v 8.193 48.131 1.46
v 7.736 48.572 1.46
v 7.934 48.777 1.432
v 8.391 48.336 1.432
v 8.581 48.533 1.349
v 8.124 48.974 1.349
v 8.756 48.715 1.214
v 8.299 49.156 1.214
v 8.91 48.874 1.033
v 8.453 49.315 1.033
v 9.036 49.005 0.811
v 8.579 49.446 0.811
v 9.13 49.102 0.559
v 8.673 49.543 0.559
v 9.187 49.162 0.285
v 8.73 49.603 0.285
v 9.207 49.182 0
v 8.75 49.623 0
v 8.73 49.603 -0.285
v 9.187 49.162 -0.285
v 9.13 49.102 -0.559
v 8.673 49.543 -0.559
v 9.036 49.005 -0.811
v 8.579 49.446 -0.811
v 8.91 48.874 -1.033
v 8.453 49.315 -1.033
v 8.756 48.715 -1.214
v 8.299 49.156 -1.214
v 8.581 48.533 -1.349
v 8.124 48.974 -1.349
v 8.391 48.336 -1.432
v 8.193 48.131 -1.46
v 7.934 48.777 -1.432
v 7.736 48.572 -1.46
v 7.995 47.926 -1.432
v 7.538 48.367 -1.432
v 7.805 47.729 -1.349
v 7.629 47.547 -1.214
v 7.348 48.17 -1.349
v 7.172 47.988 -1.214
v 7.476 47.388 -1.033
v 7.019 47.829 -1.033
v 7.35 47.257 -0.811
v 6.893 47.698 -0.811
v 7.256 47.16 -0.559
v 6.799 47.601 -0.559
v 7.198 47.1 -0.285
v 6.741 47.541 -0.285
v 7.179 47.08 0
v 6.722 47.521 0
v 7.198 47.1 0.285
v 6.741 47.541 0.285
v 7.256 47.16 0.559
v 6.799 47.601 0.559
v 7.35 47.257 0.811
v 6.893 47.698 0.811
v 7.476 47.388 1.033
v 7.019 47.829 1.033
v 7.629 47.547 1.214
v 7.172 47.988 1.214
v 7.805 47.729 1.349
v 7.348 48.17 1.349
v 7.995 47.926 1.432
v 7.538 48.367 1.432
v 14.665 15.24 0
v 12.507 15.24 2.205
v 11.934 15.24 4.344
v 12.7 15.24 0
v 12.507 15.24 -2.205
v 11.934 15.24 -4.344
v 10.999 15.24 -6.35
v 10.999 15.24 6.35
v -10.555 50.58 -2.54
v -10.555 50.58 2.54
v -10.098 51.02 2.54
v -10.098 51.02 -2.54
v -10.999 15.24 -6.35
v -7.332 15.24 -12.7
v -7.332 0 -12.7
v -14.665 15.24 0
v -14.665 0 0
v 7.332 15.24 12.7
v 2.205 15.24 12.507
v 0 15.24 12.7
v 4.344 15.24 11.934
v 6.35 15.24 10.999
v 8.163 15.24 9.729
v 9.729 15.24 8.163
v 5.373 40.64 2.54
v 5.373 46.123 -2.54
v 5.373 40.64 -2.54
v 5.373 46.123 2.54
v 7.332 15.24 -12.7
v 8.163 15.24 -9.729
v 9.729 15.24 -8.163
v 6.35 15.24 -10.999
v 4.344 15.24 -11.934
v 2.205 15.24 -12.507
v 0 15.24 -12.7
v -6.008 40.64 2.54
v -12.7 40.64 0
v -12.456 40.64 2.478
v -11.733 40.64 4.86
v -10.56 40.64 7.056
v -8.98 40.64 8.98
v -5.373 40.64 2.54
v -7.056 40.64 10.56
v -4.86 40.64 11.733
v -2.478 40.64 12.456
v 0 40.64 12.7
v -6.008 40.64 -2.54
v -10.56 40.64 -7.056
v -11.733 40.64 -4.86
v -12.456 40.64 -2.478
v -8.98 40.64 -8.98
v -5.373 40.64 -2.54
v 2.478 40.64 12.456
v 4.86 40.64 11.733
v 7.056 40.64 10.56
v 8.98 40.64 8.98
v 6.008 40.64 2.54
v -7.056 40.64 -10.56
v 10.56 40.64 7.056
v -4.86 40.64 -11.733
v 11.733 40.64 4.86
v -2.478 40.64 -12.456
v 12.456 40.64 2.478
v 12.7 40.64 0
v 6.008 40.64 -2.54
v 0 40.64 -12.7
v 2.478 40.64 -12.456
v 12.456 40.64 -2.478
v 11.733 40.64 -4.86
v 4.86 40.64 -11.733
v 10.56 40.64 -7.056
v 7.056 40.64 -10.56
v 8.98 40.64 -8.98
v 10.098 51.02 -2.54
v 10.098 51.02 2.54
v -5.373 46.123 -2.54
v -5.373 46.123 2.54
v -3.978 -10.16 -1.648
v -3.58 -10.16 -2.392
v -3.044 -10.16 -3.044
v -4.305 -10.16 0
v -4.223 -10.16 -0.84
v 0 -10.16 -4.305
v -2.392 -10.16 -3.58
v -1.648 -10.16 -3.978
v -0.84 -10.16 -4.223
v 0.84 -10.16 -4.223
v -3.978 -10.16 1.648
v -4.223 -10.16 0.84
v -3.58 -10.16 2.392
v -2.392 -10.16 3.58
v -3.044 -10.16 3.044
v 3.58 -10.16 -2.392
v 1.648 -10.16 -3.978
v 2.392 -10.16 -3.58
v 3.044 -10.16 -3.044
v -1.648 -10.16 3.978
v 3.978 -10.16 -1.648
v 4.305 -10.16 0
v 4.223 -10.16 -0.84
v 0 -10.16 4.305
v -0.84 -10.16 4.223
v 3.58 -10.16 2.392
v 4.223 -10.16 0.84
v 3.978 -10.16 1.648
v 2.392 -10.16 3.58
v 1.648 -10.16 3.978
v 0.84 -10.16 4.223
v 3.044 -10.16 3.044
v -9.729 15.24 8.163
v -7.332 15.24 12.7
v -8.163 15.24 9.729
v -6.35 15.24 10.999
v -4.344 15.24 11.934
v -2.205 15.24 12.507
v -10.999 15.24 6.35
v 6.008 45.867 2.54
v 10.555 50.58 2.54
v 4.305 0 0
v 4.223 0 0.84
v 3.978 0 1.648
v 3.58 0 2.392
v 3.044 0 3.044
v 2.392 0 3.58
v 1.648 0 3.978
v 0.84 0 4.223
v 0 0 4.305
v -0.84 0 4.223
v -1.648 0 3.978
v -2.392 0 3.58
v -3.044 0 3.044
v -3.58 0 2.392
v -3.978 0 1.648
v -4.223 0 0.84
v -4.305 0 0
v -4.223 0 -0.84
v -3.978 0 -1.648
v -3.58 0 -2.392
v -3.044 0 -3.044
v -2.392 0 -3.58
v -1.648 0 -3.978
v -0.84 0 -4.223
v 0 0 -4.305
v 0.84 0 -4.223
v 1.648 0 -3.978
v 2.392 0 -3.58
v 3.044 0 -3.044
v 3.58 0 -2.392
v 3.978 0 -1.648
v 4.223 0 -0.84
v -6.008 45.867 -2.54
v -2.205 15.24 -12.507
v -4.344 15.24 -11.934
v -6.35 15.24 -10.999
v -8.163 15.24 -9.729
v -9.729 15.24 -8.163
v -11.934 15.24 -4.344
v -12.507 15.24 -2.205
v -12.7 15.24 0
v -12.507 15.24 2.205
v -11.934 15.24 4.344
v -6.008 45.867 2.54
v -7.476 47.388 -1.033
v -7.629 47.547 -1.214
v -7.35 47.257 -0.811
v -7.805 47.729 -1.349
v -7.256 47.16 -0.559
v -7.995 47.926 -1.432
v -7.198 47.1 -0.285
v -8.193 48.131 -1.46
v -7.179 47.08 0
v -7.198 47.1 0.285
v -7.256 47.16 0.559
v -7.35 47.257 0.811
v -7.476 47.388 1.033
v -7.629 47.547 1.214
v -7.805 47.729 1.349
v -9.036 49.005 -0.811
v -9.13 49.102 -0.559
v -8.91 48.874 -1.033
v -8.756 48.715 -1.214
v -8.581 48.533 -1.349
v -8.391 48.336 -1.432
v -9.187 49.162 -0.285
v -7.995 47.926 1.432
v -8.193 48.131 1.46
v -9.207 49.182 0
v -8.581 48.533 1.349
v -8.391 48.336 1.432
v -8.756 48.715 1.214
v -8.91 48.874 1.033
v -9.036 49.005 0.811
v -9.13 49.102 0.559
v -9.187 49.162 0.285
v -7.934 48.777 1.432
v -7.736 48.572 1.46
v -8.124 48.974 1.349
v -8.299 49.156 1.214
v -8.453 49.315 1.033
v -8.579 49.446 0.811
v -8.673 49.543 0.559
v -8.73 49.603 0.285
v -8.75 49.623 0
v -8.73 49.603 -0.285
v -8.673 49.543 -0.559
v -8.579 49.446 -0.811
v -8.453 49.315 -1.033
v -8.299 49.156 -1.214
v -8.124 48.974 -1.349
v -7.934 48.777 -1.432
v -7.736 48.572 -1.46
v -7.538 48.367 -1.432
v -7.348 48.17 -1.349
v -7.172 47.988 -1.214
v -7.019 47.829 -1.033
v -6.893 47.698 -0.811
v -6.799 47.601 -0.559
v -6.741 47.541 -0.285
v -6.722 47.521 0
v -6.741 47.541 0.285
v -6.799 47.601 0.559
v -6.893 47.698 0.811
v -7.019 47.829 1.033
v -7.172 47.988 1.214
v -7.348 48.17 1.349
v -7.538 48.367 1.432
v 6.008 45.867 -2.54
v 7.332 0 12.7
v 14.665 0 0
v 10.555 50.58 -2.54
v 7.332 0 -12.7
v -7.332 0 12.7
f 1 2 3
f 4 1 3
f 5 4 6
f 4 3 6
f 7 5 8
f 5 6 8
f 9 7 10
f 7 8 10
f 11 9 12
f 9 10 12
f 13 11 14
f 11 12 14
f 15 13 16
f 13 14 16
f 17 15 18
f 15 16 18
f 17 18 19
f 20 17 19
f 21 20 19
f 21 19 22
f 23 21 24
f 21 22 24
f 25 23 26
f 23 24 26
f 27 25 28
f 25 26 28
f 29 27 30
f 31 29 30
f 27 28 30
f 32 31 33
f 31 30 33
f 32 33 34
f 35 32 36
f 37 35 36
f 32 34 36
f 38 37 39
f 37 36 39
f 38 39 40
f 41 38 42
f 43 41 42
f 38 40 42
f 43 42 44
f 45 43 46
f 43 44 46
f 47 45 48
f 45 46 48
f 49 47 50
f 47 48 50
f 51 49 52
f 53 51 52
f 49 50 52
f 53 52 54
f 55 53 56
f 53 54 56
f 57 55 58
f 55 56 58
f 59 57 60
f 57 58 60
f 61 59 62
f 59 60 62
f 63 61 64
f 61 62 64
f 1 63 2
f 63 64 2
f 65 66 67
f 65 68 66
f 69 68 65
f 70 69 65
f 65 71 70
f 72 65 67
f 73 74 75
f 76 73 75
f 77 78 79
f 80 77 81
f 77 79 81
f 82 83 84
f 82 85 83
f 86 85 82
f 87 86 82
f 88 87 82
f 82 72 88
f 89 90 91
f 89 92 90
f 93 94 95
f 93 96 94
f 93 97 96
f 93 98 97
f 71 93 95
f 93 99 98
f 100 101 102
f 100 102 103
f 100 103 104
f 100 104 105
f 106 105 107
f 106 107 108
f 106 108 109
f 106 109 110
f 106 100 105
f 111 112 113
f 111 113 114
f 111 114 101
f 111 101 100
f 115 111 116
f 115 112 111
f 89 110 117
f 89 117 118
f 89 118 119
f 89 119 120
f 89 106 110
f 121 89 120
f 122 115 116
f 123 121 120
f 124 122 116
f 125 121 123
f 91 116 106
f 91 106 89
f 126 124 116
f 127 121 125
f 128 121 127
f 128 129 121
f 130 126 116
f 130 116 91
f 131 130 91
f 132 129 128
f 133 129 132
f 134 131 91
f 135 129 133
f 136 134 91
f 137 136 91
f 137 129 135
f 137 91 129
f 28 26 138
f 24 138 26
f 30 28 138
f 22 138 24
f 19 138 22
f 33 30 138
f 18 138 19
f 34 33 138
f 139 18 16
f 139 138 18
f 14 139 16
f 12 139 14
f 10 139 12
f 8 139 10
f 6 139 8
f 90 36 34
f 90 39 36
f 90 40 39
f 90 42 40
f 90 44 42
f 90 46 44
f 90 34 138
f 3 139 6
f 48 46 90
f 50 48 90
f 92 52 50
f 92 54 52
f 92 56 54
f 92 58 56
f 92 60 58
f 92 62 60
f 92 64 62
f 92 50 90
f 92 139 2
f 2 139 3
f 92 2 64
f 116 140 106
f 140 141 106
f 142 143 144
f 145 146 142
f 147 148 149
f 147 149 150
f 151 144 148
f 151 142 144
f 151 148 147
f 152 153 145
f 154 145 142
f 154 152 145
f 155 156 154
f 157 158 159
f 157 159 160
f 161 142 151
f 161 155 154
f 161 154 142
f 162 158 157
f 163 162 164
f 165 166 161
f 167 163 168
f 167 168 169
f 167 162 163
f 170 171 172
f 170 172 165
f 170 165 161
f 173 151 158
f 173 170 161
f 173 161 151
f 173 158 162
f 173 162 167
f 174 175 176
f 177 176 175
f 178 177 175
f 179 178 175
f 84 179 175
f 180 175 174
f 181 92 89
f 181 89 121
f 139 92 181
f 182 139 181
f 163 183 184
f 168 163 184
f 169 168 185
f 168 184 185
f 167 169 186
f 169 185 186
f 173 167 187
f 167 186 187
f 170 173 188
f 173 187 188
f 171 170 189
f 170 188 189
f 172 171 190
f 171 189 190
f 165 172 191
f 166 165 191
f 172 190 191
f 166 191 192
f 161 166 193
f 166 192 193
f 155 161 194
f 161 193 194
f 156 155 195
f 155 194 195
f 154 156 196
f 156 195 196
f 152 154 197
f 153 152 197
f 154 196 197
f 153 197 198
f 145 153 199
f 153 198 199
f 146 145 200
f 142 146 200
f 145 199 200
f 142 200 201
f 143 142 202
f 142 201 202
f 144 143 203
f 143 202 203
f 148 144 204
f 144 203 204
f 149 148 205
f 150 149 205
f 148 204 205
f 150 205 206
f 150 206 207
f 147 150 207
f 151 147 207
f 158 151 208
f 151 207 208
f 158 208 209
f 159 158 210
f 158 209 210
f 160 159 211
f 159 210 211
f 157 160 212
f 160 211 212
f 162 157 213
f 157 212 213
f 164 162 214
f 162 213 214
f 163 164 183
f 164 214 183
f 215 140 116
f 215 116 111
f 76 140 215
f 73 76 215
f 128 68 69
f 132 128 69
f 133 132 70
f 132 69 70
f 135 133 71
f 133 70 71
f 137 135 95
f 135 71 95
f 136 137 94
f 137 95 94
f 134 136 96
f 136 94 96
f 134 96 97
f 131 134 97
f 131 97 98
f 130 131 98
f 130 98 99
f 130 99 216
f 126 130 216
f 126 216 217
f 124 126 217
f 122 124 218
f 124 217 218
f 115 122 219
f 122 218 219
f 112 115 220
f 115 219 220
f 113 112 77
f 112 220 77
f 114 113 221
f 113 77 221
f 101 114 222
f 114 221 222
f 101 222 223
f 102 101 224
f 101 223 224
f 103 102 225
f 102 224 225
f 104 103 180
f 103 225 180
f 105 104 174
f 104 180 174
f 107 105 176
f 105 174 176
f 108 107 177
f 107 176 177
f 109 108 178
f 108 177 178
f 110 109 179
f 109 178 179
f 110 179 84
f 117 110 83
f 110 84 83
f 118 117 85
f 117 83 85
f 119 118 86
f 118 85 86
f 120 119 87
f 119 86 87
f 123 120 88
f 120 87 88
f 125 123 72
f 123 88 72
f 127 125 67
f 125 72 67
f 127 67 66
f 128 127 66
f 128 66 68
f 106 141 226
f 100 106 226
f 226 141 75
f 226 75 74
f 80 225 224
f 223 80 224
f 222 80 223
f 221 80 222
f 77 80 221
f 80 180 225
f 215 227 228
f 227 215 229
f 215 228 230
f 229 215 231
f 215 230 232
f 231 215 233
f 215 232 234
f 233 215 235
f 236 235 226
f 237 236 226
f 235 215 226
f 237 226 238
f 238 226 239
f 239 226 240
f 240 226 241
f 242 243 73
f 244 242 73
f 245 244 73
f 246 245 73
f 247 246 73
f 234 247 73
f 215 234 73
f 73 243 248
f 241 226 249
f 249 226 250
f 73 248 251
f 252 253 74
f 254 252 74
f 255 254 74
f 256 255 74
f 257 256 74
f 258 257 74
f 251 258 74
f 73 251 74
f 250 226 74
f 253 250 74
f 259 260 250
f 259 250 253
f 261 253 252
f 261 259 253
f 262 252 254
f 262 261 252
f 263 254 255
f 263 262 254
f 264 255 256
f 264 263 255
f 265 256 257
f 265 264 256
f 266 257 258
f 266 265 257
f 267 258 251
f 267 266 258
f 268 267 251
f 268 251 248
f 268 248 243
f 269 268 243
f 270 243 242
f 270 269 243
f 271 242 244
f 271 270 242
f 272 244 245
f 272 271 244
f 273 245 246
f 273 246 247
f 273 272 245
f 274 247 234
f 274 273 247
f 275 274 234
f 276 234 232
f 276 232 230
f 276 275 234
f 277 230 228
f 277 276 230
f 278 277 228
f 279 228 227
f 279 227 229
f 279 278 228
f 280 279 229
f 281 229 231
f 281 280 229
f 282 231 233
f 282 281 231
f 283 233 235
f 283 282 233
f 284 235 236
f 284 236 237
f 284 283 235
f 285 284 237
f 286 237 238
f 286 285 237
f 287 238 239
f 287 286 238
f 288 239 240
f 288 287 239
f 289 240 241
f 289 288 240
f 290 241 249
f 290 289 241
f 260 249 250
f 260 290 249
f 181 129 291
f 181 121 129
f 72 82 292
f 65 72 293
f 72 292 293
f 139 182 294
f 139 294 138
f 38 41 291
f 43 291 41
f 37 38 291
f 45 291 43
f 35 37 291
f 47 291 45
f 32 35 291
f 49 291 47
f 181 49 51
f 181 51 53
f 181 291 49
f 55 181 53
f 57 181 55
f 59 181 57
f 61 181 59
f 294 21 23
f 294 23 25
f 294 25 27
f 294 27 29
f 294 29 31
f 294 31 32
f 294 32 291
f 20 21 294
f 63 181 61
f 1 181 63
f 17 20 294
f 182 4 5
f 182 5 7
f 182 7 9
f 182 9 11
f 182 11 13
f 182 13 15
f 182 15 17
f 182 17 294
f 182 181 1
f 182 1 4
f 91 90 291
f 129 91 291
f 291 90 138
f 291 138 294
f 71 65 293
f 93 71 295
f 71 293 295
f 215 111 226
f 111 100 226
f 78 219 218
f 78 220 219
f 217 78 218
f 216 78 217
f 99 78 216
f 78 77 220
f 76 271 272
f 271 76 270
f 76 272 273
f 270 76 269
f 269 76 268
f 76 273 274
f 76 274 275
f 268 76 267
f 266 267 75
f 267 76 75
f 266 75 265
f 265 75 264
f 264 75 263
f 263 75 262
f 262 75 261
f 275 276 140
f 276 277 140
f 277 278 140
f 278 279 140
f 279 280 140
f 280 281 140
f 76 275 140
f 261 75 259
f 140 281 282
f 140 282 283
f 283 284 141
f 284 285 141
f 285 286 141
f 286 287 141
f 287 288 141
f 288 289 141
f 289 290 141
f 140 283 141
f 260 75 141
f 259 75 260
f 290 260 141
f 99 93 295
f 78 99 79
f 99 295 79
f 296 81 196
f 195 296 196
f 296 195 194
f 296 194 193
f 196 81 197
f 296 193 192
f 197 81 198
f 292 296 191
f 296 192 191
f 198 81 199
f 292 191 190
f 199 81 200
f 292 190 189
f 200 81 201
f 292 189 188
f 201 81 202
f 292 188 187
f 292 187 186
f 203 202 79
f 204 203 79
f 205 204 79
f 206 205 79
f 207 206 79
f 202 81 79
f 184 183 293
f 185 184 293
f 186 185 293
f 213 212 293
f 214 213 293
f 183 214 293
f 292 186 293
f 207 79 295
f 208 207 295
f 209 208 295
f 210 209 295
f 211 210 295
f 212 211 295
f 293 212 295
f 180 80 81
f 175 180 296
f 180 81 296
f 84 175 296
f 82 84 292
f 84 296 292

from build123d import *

# Parameters (mm, degrees)
BOSS_EXTRUDE1_DEPTH = 15.24
SKETCH3_R           = 12.7
BOSS_EXTRUDE2_DEPTH = 25.4
SKETCH4_R           = 4.3053
BOSS_EXTRUDE3_DEPTH = 10.16
EXTRUDE_THIN1_DEPTH = 2.54
CUT_EXTRUDE1_REACH  = 50.698
SKETCH6_R           = 1.4605


with BuildPart() as part:
    # Sketch2 → Boss-Extrude1 (new body)
    with BuildSketch(Plane(origin=(0, 0, 0), x_dir=(1, 0, 0), z_dir=(0, 1, 0))):
        Polygon((7.332348419, 12.7), (-7.332348419, 12.7), (-14.664696837, 0), (-7.332348419, -12.7), (7.332348419, -12.7), (14.664696837, 0), align=None)
    extrude(amount=BOSS_EXTRUDE1_DEPTH)

    # Sketch3 → Boss-Extrude2 (add)
    with BuildSketch(Plane(origin=(0, 15.24, 0), x_dir=(1, 0, 0), z_dir=(0, 1, 0))):
        Circle(SKETCH3_R)
    extrude(amount=BOSS_EXTRUDE2_DEPTH)

    # Sketch4 → Boss-Extrude3 (add)
    with BuildSketch(Plane.XZ):
        Circle(SKETCH4_R)
    extrude(amount=BOSS_EXTRUDE3_DEPTH)

    # Sketch5 → Extrude-Thin1 (add, symmetric)
    with BuildSketch(Plane.XY):
        Polygon((6.008182396, 40.64), (6.008182396, 45.866997676), (10.555270964, 50.579540341), (10.098307994, 51.020459659), (5.373182396, 46.123401761), (5.373182396, 40.64), align=None)
    extrude_thin1 = extrude(amount=EXTRUDE_THIN1_DEPTH, both=True)

    # Sketch6 → Cut-Extrude1 (cut, up to next)
    with BuildSketch(Plane(origin=(-20.264409117, 19.552939797, 0), x_dir=(0, 0, 1), z_dir=(-0.7196267237821845, 0.6943611296857851, 0)), mode=Mode.PRIVATE) as cut_extrude1_sk1:
        with Locations((0, 40.325060137)):
            Circle(SKETCH6_R)
    cut_extrude1_tool1 = extrude(cut_extrude1_sk1.sketch, amount=-CUT_EXTRUDE1_REACH, mode=Mode.PRIVATE) & part.part
    cut_extrude1 = cut_extrude1_tool1.solids().sort_by_distance((7.735745, 48.571931, 0))[0]
    add(cut_extrude1, mode=Mode.SUBTRACT)

    # Mirror1: Extrude-Thin1, Cut-Extrude1 across plane
    add(extrude_thin1.mirror(Plane(origin=(0, 0, 0), x_dir=(0, 0, 1), z_dir=(1, 0, 0))))
    add(cut_extrude1.mirror(Plane(origin=(0, 0, 0), x_dir=(0, 0, 1), z_dir=(1, 0, 0))), mode=Mode.SUBTRACT)


solid = part.part
